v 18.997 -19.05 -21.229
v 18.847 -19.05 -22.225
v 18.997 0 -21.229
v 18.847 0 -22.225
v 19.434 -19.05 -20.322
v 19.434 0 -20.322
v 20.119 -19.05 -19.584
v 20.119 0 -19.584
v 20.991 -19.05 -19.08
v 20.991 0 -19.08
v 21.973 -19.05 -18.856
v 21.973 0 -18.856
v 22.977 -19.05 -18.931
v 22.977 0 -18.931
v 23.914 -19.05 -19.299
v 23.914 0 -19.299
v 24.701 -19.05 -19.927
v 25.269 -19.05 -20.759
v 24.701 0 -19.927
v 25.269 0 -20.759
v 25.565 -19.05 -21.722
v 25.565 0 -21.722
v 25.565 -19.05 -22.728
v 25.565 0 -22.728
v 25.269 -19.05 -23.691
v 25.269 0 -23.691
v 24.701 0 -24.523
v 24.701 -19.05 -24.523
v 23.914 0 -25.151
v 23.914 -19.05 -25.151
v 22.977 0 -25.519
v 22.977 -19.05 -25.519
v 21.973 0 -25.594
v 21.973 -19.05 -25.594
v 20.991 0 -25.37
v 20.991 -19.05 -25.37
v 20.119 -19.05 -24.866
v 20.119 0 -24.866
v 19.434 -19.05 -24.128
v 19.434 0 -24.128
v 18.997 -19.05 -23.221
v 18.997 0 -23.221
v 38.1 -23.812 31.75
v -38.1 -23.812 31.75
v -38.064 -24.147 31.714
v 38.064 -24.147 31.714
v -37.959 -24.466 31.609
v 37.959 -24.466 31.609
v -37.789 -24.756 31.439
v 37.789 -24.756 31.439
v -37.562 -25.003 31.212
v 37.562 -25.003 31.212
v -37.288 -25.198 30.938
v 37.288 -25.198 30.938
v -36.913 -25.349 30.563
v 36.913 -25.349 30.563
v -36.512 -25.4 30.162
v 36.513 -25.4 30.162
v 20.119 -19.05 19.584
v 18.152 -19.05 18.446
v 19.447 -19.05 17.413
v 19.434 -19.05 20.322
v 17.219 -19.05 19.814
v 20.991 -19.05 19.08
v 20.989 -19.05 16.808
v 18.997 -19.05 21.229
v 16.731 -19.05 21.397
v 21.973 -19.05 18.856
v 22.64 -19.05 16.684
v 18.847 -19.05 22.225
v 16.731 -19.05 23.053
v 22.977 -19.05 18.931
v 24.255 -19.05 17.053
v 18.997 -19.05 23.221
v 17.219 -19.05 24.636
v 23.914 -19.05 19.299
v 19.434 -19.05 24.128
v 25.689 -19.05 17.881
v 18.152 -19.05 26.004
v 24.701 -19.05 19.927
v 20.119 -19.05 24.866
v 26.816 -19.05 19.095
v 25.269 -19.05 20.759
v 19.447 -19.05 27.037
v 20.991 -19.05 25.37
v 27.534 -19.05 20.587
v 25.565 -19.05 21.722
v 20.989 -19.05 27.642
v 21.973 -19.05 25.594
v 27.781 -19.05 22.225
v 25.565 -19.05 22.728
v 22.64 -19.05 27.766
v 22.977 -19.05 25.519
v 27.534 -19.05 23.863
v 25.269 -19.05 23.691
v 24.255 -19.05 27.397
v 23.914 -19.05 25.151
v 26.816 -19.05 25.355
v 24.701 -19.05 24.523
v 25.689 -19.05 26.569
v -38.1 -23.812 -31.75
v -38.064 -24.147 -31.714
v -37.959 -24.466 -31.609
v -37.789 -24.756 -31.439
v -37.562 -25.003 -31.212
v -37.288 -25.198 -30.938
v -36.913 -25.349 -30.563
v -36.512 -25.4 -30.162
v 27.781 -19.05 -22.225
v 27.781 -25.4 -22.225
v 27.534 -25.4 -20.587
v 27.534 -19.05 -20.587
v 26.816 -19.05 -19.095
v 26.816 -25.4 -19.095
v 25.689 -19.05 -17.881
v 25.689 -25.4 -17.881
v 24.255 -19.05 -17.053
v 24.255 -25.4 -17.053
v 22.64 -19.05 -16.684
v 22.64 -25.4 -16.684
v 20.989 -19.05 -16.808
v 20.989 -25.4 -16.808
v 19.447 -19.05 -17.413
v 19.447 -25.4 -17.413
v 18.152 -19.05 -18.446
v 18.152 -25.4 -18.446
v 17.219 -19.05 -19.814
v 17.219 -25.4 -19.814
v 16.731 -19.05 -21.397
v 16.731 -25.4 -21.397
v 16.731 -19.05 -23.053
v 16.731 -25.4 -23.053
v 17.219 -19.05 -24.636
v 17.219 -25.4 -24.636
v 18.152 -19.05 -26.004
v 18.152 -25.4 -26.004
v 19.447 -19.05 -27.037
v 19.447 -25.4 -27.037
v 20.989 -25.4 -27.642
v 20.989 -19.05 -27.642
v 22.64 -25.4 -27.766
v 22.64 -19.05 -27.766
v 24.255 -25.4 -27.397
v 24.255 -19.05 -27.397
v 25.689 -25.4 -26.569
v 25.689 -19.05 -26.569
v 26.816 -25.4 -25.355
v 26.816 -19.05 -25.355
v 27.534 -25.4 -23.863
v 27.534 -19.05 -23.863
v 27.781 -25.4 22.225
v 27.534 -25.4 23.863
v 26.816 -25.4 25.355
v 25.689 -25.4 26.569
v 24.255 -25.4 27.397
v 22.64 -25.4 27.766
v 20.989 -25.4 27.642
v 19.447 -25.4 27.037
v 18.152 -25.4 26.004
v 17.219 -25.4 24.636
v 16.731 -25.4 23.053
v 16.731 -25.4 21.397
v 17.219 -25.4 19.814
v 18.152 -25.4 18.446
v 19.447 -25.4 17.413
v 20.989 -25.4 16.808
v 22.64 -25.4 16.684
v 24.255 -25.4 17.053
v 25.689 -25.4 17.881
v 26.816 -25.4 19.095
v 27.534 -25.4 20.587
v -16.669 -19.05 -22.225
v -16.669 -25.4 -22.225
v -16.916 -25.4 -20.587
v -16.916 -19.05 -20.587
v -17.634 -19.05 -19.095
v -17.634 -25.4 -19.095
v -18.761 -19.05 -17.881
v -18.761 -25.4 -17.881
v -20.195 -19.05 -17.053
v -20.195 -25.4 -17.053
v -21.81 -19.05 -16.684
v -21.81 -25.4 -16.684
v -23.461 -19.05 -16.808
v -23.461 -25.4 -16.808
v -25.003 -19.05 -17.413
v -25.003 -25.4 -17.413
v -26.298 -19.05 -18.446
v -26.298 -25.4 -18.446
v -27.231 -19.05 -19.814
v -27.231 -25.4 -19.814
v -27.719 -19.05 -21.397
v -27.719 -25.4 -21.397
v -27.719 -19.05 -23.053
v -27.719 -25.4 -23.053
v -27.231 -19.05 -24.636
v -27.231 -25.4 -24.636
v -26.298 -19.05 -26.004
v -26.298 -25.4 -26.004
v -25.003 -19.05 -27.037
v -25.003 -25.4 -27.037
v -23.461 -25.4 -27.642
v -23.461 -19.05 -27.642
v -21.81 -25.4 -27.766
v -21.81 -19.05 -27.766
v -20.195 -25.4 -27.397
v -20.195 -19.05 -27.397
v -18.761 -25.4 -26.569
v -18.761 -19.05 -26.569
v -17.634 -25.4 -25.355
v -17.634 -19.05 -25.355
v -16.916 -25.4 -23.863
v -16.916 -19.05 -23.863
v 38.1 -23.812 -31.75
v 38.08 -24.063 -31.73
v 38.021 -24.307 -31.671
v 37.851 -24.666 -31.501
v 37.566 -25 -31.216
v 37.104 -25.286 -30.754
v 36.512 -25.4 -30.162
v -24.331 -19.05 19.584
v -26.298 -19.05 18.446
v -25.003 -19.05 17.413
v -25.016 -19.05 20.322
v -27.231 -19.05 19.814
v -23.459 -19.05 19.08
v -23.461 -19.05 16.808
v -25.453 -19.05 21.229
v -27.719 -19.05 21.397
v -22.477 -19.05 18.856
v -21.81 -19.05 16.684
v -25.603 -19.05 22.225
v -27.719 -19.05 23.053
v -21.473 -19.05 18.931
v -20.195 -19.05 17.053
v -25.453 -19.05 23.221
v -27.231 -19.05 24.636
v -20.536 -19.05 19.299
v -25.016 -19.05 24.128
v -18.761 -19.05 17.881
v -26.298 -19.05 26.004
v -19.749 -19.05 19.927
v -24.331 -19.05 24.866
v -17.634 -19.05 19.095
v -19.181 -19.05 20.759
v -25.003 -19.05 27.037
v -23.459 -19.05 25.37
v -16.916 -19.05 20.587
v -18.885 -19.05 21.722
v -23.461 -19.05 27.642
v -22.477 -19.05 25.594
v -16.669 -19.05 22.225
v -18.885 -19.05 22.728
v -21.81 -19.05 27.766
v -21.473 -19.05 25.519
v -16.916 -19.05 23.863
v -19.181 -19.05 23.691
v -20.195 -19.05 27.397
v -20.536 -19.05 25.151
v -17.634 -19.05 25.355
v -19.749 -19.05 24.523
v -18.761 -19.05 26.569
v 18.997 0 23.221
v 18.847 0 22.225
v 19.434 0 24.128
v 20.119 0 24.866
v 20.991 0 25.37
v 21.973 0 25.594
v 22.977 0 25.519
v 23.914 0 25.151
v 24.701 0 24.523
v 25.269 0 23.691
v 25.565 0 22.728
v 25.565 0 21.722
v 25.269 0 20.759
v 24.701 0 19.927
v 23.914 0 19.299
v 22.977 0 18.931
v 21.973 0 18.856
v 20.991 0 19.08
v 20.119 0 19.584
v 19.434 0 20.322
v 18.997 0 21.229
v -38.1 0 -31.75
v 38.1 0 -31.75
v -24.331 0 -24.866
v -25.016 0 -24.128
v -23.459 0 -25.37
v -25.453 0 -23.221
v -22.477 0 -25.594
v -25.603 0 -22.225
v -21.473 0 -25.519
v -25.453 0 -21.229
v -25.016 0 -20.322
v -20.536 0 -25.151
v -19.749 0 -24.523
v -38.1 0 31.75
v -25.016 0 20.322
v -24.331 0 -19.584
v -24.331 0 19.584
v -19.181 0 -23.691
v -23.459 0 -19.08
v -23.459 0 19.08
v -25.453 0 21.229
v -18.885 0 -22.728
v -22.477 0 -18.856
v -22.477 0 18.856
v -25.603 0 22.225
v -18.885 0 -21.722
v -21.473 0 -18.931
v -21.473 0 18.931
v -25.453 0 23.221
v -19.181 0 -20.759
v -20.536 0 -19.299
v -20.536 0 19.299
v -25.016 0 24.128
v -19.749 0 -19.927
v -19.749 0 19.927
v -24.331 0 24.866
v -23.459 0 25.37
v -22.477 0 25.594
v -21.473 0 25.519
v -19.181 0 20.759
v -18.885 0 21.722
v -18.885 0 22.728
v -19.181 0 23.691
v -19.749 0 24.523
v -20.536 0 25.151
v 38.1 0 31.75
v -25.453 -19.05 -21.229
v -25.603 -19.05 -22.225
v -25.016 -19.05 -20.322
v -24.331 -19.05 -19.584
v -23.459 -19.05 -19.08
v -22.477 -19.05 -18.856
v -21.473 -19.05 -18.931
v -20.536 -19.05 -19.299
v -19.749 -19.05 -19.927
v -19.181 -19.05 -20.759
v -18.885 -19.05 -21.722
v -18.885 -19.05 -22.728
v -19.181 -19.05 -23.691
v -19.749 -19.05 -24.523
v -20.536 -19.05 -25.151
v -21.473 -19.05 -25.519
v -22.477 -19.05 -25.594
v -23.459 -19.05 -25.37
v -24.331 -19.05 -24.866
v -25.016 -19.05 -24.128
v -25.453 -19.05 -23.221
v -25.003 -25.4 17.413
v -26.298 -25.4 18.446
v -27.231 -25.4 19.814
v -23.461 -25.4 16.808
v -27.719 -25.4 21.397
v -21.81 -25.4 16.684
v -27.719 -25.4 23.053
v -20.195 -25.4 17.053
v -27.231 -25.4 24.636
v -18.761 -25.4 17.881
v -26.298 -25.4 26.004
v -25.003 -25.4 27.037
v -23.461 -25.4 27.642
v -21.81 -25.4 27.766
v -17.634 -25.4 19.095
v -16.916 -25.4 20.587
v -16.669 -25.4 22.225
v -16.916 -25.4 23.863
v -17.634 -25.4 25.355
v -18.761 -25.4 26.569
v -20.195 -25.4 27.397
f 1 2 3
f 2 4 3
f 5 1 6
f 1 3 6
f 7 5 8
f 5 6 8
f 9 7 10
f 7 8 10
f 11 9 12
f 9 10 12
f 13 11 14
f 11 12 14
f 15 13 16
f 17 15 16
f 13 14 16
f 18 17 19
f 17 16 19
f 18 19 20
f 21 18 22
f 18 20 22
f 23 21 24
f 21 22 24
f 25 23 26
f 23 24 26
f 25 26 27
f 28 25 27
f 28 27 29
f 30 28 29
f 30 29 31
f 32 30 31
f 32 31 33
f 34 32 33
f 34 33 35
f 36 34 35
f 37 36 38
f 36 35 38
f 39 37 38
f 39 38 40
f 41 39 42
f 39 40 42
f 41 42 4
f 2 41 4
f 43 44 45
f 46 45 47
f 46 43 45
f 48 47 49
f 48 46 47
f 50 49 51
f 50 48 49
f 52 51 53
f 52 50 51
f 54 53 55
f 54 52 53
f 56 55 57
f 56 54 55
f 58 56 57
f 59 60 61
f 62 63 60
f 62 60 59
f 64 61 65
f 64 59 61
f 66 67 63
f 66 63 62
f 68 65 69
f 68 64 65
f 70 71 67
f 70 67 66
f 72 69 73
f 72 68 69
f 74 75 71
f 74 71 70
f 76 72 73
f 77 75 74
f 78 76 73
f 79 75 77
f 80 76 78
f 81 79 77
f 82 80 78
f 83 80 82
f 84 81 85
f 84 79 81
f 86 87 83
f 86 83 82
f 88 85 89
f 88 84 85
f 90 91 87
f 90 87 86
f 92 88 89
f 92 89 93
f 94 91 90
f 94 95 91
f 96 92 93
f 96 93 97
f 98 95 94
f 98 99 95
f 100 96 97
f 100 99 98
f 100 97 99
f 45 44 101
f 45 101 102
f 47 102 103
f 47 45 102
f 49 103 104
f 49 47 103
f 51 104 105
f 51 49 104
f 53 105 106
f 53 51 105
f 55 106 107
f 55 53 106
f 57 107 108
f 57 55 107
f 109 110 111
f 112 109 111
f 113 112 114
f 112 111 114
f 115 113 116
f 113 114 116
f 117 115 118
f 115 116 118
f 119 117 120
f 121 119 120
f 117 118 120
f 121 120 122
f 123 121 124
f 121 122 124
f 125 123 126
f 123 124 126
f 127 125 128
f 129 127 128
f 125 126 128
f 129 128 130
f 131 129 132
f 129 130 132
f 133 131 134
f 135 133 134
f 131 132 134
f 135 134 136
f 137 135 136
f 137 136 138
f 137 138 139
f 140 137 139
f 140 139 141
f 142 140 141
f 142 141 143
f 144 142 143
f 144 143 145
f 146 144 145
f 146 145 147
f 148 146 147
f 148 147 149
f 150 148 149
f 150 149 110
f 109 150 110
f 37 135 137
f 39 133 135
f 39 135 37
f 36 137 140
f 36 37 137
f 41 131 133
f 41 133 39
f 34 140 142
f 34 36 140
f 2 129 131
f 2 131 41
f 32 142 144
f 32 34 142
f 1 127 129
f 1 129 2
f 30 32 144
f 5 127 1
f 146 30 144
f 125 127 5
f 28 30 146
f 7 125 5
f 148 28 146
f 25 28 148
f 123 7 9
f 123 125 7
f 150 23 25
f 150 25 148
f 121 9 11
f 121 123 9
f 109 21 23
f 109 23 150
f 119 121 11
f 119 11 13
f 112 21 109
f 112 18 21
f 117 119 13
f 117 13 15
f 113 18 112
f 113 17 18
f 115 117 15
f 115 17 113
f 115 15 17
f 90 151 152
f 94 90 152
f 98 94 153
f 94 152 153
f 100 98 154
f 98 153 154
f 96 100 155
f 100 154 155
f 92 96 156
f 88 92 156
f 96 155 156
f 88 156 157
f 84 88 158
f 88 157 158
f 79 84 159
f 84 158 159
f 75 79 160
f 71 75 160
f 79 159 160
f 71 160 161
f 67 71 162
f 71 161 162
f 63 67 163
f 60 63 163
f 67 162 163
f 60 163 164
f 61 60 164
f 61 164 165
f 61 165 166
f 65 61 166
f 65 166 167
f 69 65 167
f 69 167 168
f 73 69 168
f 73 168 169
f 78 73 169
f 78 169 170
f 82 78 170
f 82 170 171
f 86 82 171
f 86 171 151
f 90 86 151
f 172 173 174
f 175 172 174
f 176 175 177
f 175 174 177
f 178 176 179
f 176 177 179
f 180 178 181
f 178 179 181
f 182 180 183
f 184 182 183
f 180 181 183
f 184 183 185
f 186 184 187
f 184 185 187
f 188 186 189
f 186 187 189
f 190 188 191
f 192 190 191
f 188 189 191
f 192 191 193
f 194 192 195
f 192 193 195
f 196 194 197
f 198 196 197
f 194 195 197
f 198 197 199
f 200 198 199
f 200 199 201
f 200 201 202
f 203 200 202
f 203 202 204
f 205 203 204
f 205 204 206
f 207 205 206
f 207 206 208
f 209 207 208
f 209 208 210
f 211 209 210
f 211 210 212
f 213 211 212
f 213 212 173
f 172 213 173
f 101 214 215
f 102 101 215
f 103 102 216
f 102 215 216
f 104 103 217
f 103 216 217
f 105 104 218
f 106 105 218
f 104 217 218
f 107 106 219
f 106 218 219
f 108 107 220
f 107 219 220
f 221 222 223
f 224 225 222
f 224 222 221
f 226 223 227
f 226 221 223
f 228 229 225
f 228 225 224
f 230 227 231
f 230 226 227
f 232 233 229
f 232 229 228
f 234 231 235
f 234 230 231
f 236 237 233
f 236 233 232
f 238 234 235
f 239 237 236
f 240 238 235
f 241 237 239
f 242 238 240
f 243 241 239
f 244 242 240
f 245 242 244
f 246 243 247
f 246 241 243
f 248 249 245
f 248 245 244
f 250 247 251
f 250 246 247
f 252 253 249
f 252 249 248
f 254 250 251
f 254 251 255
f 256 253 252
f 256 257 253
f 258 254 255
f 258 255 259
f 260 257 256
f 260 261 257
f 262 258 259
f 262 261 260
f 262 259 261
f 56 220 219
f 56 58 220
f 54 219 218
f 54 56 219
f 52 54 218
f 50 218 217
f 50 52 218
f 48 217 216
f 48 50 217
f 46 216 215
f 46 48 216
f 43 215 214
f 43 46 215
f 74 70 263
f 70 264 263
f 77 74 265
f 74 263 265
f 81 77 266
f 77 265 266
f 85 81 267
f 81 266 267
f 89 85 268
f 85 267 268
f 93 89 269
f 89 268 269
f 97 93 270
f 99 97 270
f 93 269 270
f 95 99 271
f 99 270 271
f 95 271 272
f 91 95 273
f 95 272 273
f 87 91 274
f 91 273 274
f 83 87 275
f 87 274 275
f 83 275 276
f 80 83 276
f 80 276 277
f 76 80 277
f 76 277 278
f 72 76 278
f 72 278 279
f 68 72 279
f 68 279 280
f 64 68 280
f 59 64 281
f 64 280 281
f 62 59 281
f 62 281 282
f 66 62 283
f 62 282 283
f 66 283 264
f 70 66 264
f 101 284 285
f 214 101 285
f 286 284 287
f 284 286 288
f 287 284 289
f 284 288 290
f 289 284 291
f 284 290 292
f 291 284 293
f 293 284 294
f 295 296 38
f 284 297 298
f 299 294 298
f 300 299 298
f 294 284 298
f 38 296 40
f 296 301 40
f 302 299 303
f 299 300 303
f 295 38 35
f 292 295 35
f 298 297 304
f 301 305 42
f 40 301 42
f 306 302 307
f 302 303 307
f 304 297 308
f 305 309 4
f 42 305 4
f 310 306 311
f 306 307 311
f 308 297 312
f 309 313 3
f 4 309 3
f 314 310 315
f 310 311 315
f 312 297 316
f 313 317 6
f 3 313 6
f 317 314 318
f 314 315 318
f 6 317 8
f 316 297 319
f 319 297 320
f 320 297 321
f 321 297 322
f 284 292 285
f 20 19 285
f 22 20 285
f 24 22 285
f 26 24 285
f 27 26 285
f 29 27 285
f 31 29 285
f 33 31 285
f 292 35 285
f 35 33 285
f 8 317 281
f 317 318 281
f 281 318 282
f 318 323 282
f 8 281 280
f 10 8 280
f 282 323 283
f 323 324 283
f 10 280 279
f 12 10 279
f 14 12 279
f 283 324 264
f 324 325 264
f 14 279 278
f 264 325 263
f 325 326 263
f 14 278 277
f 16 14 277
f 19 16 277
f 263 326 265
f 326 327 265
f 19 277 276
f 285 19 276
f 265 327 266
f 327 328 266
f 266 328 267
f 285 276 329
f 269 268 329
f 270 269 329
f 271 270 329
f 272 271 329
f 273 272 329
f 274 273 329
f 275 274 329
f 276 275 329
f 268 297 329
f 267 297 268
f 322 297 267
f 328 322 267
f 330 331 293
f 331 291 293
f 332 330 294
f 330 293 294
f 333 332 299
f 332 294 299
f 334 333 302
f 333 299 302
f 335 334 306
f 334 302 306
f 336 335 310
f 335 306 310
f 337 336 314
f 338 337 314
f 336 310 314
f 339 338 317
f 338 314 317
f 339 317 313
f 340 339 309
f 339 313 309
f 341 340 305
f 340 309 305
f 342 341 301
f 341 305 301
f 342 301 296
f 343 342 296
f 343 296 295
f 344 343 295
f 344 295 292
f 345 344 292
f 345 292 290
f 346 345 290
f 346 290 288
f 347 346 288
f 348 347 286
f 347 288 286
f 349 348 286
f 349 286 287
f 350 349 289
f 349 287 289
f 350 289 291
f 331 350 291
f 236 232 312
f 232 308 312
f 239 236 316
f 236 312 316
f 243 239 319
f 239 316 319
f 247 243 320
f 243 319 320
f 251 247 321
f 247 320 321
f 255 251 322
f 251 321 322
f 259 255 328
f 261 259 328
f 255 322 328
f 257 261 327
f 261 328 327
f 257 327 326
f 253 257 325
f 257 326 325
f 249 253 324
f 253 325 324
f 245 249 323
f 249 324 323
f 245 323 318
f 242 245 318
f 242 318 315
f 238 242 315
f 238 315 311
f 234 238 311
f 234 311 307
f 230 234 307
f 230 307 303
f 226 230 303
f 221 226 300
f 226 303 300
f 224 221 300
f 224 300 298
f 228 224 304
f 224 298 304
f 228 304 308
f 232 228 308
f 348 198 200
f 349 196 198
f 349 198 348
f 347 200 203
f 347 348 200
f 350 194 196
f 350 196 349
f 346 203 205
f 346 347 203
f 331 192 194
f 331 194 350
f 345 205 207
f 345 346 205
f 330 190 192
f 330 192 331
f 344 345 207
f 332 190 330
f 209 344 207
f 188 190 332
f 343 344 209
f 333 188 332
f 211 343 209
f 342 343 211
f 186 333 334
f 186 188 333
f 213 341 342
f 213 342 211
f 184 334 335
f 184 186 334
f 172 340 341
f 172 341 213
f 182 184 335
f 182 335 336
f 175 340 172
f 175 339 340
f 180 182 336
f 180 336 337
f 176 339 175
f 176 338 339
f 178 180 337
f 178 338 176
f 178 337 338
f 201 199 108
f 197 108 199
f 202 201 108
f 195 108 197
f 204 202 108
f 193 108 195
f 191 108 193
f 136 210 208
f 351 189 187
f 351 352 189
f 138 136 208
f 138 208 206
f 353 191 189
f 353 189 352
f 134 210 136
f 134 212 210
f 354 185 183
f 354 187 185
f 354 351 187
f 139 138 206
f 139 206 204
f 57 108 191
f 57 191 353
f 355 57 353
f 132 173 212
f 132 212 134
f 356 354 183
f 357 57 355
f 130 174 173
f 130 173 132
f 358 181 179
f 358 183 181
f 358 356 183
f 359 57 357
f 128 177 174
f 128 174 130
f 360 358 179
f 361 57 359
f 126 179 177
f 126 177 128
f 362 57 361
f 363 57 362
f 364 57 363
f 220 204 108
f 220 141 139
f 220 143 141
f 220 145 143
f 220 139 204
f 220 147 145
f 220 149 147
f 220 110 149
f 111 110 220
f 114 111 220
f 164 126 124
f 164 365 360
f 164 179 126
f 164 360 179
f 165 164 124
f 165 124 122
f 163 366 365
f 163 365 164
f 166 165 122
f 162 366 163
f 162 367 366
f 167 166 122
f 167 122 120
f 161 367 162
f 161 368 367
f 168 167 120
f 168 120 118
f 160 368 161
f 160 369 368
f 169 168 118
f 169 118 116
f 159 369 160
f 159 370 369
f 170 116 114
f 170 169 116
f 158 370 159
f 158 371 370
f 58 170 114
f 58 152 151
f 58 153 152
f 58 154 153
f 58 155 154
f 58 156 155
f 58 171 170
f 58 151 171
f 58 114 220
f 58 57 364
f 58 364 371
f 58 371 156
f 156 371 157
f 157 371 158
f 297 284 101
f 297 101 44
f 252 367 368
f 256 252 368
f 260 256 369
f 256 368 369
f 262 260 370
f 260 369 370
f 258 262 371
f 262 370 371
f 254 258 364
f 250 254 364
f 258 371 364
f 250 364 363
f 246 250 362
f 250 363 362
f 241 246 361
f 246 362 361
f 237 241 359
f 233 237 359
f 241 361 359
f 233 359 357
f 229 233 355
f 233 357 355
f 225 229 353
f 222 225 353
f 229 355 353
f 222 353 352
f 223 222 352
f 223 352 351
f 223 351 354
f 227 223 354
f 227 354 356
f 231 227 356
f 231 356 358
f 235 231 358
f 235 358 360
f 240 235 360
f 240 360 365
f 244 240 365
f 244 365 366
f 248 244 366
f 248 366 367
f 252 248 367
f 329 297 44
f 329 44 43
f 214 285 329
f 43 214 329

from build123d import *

# Parameters (mm, degrees)
F0_W           = 76.2
F0_H           = 63.5
F1_DEPTH       = 25.4
F3_D           = 6.7564
F3_CBORE_D     = 11.1125
F3_CBORE_DEPTH = 6.35
F4_R           = 1.5875


with BuildPart() as f1:
    # F0 (on Front) → F1 (new body)
    with BuildSketch(Plane.XZ):
        Rectangle(F0_W, F0_H)
    extrude(amount=F1_DEPTH)

    # F3 (through all)
    with Locations(Plane.XZ.offset(25.4)):
        with Locations((-22.225, 22.225), (22.225, 22.225), (22.225, -22.225), (-22.225, -22.225)):
            CounterBoreHole(F3_D / 2, F3_CBORE_D / 2, F3_CBORE_DEPTH)

    # F4
    f4_edges = [f1.edges().sort_by_distance(p)[0] for p in [
        (0, -25.4, 31.75),
        (38.1, -25.4, 0),
        (0, -25.4, -31.75),
        (-38.1, -25.4, 0),
    ]]
    fillet(f4_edges, radius=F4_R)


solid = f1.part
